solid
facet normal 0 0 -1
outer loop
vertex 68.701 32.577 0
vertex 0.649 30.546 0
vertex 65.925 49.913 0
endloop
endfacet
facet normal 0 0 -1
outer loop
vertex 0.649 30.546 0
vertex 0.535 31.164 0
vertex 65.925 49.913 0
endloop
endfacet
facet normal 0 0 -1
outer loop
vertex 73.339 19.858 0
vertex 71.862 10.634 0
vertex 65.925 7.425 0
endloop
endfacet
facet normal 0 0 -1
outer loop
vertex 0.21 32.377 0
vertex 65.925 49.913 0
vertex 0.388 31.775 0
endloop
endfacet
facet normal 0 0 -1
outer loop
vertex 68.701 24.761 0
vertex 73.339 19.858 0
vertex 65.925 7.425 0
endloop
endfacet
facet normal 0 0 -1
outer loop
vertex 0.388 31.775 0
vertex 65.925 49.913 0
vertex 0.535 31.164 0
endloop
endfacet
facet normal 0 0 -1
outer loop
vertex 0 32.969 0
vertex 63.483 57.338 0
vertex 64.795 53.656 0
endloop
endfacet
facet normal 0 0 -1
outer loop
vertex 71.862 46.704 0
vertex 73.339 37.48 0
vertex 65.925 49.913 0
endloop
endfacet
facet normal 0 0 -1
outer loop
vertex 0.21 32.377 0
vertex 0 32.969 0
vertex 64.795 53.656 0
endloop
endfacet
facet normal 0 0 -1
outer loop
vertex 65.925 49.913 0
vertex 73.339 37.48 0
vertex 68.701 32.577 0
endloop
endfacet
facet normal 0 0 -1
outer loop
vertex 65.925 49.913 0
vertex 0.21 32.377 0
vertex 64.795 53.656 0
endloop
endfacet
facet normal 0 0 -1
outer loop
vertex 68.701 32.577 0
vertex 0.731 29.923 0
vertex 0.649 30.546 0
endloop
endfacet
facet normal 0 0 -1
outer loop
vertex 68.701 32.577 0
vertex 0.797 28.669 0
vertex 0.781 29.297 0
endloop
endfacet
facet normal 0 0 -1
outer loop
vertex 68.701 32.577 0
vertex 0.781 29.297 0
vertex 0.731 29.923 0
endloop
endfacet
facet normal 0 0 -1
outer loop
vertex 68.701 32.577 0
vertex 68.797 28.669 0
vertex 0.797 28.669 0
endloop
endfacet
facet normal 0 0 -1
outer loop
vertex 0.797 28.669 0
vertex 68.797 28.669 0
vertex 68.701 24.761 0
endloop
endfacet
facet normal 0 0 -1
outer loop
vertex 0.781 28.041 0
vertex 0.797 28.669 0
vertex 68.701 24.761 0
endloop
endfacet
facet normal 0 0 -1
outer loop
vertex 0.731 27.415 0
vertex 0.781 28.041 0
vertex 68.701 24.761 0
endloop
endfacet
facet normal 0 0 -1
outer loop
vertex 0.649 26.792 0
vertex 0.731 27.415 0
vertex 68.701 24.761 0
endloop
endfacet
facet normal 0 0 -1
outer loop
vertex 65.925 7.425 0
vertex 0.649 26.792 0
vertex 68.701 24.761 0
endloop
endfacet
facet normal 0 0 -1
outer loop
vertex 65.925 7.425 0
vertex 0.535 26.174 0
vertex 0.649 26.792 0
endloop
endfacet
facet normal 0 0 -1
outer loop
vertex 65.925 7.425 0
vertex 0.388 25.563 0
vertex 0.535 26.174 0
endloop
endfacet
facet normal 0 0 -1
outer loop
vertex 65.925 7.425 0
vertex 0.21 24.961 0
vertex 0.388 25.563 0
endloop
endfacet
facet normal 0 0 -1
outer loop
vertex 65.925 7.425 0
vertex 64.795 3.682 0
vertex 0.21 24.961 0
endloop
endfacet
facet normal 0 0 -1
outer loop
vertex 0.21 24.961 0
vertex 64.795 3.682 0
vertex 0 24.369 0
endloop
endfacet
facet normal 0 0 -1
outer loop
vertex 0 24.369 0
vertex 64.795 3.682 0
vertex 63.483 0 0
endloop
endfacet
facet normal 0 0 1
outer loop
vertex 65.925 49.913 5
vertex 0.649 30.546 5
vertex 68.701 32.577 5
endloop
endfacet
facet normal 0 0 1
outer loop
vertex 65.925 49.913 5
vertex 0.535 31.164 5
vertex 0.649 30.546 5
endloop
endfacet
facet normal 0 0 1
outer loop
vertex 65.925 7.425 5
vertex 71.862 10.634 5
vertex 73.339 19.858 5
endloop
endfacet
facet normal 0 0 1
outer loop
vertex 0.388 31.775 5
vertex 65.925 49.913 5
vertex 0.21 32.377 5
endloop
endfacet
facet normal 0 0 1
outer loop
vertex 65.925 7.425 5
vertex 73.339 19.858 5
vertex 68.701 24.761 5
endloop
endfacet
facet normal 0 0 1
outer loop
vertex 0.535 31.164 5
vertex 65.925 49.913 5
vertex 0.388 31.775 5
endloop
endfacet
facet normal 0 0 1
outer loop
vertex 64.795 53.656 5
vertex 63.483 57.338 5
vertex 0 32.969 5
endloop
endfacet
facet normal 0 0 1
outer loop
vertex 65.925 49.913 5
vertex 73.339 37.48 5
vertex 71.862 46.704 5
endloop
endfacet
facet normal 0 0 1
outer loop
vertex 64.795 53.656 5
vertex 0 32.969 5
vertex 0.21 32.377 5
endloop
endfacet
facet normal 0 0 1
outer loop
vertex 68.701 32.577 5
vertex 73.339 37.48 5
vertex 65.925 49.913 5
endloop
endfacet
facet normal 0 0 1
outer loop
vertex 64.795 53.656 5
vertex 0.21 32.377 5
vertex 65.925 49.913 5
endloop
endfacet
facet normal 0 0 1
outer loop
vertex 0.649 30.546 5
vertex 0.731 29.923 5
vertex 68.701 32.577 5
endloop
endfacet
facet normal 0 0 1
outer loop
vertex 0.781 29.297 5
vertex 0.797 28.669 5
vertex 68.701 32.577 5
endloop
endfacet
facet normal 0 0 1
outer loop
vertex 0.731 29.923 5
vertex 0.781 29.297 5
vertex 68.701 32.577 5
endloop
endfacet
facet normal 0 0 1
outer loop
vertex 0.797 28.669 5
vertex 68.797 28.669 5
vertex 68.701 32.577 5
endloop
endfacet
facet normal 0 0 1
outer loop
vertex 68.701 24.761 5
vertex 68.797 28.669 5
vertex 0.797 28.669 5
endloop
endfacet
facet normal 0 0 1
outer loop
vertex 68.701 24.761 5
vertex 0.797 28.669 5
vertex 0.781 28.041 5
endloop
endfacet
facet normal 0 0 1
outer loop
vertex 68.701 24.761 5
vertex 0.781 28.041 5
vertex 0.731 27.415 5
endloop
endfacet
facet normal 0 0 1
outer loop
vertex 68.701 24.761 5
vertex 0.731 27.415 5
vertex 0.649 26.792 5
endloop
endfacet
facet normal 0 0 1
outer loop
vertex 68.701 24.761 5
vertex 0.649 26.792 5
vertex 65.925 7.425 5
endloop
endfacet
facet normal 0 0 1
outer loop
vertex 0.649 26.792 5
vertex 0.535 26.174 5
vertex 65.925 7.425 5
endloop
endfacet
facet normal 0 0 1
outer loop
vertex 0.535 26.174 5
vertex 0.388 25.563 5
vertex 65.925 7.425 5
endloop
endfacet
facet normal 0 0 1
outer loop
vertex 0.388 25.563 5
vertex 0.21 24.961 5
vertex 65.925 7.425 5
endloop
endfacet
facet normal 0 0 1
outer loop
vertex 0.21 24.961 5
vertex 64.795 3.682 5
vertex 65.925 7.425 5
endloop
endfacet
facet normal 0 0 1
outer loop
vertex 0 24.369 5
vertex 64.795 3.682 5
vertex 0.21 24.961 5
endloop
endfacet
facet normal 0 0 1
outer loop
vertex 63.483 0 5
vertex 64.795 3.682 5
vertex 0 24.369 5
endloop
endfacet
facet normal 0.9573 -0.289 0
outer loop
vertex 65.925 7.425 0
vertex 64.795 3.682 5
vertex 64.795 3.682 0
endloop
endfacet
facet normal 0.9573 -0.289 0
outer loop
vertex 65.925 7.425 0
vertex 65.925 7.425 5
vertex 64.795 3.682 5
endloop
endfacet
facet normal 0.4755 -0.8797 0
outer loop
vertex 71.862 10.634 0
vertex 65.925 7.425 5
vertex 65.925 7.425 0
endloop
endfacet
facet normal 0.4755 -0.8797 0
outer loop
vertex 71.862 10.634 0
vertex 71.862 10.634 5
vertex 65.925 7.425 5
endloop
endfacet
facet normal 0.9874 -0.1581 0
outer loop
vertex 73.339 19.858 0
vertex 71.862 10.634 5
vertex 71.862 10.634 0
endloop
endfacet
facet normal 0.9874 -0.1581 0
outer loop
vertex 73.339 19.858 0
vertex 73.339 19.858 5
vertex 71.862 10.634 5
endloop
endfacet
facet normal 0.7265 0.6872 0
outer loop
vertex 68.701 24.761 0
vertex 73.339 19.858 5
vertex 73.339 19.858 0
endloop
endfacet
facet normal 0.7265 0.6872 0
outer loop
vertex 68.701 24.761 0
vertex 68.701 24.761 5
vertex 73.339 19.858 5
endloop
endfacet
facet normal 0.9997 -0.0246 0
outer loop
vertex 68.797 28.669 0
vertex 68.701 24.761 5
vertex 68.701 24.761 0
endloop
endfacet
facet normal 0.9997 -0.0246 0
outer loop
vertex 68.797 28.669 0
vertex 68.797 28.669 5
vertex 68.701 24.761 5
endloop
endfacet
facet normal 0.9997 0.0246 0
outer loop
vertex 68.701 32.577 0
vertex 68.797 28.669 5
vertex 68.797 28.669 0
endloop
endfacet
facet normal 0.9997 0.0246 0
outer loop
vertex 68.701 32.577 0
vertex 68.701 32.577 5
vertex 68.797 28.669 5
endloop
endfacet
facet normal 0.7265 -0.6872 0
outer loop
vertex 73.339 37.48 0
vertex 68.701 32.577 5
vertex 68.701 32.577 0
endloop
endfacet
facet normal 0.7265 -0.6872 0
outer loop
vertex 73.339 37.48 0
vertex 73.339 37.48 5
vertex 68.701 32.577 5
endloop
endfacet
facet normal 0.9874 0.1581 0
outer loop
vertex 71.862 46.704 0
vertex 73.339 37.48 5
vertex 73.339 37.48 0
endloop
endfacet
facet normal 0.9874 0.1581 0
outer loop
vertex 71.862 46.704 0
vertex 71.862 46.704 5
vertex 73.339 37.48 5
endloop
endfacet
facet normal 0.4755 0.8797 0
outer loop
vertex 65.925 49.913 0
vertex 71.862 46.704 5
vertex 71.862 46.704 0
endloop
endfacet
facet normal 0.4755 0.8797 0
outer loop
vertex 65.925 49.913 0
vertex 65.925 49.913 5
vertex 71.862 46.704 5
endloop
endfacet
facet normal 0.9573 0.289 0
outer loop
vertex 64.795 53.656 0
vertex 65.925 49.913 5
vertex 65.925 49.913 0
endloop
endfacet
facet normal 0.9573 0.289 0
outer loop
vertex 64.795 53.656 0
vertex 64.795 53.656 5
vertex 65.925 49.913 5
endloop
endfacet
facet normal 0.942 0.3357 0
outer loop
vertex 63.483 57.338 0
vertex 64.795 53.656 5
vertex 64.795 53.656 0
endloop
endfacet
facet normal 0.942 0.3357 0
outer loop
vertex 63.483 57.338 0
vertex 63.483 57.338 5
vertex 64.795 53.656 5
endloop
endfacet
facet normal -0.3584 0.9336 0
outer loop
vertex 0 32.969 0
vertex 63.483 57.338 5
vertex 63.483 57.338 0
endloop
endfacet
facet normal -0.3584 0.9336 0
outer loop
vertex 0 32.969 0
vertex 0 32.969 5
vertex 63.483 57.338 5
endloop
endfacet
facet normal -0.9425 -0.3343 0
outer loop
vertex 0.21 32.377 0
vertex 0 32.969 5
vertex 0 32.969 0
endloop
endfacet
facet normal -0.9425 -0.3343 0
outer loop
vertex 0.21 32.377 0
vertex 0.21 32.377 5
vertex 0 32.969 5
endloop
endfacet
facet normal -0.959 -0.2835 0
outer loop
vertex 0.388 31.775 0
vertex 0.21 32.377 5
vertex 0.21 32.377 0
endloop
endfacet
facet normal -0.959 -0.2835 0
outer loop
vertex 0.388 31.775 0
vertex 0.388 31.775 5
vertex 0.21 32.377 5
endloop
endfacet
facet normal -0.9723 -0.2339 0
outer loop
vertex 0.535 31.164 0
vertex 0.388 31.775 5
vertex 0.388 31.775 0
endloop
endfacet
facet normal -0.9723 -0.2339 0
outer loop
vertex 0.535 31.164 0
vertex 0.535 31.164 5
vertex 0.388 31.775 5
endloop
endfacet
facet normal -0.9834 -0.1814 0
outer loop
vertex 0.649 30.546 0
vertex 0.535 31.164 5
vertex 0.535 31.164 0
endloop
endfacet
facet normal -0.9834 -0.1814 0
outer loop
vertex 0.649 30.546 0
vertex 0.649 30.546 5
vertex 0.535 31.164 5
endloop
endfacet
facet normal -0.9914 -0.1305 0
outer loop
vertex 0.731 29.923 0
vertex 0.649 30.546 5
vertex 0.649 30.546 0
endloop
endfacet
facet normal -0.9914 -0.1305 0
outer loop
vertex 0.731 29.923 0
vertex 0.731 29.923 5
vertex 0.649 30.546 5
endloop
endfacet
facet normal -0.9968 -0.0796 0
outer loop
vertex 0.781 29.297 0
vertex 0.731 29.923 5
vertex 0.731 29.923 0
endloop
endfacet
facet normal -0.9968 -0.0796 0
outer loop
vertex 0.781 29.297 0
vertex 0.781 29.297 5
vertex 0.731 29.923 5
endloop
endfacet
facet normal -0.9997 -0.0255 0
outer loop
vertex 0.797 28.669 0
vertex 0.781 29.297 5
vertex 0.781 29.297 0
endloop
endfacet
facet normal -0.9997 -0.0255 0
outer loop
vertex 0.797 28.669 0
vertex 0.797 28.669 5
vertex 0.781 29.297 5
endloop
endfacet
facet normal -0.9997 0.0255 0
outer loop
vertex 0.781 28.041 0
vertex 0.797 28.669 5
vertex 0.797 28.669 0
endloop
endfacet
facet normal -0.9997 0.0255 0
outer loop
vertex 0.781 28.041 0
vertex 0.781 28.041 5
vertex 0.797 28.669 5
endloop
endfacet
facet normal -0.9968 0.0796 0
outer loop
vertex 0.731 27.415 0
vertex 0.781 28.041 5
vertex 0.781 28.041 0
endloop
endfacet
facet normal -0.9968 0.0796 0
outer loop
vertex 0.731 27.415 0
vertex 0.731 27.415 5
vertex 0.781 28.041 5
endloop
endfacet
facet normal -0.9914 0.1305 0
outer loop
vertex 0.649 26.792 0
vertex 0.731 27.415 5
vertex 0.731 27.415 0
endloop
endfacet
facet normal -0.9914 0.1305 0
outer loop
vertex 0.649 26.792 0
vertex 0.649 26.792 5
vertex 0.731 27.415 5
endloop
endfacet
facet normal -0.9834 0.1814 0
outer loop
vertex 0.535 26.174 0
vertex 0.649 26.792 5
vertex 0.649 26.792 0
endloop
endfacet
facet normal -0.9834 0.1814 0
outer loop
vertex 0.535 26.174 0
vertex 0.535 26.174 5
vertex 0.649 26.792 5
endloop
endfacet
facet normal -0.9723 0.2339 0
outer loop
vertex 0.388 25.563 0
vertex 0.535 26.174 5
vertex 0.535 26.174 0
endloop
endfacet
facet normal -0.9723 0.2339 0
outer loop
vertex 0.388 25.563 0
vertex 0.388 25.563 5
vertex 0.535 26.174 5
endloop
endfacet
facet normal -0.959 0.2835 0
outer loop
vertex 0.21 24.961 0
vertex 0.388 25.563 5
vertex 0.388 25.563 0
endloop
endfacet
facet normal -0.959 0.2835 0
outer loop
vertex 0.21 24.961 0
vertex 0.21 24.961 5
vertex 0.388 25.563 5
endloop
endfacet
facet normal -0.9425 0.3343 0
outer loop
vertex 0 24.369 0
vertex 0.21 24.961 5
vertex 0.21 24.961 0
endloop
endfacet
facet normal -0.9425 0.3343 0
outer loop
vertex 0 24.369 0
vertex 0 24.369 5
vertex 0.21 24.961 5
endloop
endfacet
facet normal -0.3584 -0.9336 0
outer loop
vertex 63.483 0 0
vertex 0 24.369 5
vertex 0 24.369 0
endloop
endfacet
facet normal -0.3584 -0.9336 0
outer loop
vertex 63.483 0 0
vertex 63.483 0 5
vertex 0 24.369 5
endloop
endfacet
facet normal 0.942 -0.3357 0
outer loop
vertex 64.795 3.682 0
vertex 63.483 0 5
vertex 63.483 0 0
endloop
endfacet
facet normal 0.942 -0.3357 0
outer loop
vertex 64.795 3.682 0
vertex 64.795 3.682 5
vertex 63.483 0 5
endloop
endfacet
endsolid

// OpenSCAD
$fn = 32;

// ----------------------------------------------------------------------
// Gear sector: 2 teeth on 42 degrees
// ----------------------------------------------------------------------

// --- parameters (mm) ---
sector_angle = 42;        // sector angle, degrees
root_r = 80;              // root circle radius
tooth_h = 5;              // tooth height over the root circle
teeth = 2;                // number of teeth on the sector
hub_r = 12;               // hub bore radius
plate_t = 5;              // sector thickness, Z
arc_step = 3;             // sampling step of the root/hub arcs, degrees
fit_tol = 0.05;           // declared fit tolerance (prompt contract)
free_tol = 0.2;           // declared free tolerance (prompt contract)

tip_r = root_r + tooth_h;  // tip circle radius

profile = [[63.483, 0], [64.795, 3.682], [65.925, 7.425], [71.862, 10.634], [73.339, 19.858], [68.701, 24.761], [68.797, 28.669], [68.701, 32.577], [73.339, 37.48], [71.862, 46.704], [65.925, 49.913], [64.795, 53.656], [63.483, 57.338], [0, 32.969], [0.21, 32.377], [0.388, 31.775], [0.535, 31.164], [0.649, 30.546], [0.731, 29.923], [0.781, 29.297], [0.797, 28.669], [0.781, 28.041], [0.731, 27.415], [0.649, 26.792], [0.535, 26.174], [0.388, 25.563], [0.21, 24.961], [0, 24.369]];  // primary outline, 28 points, counter clockwise

// --- the one profile operation ---
linear_extrude(height = plate_t) polygon(points = profile);
